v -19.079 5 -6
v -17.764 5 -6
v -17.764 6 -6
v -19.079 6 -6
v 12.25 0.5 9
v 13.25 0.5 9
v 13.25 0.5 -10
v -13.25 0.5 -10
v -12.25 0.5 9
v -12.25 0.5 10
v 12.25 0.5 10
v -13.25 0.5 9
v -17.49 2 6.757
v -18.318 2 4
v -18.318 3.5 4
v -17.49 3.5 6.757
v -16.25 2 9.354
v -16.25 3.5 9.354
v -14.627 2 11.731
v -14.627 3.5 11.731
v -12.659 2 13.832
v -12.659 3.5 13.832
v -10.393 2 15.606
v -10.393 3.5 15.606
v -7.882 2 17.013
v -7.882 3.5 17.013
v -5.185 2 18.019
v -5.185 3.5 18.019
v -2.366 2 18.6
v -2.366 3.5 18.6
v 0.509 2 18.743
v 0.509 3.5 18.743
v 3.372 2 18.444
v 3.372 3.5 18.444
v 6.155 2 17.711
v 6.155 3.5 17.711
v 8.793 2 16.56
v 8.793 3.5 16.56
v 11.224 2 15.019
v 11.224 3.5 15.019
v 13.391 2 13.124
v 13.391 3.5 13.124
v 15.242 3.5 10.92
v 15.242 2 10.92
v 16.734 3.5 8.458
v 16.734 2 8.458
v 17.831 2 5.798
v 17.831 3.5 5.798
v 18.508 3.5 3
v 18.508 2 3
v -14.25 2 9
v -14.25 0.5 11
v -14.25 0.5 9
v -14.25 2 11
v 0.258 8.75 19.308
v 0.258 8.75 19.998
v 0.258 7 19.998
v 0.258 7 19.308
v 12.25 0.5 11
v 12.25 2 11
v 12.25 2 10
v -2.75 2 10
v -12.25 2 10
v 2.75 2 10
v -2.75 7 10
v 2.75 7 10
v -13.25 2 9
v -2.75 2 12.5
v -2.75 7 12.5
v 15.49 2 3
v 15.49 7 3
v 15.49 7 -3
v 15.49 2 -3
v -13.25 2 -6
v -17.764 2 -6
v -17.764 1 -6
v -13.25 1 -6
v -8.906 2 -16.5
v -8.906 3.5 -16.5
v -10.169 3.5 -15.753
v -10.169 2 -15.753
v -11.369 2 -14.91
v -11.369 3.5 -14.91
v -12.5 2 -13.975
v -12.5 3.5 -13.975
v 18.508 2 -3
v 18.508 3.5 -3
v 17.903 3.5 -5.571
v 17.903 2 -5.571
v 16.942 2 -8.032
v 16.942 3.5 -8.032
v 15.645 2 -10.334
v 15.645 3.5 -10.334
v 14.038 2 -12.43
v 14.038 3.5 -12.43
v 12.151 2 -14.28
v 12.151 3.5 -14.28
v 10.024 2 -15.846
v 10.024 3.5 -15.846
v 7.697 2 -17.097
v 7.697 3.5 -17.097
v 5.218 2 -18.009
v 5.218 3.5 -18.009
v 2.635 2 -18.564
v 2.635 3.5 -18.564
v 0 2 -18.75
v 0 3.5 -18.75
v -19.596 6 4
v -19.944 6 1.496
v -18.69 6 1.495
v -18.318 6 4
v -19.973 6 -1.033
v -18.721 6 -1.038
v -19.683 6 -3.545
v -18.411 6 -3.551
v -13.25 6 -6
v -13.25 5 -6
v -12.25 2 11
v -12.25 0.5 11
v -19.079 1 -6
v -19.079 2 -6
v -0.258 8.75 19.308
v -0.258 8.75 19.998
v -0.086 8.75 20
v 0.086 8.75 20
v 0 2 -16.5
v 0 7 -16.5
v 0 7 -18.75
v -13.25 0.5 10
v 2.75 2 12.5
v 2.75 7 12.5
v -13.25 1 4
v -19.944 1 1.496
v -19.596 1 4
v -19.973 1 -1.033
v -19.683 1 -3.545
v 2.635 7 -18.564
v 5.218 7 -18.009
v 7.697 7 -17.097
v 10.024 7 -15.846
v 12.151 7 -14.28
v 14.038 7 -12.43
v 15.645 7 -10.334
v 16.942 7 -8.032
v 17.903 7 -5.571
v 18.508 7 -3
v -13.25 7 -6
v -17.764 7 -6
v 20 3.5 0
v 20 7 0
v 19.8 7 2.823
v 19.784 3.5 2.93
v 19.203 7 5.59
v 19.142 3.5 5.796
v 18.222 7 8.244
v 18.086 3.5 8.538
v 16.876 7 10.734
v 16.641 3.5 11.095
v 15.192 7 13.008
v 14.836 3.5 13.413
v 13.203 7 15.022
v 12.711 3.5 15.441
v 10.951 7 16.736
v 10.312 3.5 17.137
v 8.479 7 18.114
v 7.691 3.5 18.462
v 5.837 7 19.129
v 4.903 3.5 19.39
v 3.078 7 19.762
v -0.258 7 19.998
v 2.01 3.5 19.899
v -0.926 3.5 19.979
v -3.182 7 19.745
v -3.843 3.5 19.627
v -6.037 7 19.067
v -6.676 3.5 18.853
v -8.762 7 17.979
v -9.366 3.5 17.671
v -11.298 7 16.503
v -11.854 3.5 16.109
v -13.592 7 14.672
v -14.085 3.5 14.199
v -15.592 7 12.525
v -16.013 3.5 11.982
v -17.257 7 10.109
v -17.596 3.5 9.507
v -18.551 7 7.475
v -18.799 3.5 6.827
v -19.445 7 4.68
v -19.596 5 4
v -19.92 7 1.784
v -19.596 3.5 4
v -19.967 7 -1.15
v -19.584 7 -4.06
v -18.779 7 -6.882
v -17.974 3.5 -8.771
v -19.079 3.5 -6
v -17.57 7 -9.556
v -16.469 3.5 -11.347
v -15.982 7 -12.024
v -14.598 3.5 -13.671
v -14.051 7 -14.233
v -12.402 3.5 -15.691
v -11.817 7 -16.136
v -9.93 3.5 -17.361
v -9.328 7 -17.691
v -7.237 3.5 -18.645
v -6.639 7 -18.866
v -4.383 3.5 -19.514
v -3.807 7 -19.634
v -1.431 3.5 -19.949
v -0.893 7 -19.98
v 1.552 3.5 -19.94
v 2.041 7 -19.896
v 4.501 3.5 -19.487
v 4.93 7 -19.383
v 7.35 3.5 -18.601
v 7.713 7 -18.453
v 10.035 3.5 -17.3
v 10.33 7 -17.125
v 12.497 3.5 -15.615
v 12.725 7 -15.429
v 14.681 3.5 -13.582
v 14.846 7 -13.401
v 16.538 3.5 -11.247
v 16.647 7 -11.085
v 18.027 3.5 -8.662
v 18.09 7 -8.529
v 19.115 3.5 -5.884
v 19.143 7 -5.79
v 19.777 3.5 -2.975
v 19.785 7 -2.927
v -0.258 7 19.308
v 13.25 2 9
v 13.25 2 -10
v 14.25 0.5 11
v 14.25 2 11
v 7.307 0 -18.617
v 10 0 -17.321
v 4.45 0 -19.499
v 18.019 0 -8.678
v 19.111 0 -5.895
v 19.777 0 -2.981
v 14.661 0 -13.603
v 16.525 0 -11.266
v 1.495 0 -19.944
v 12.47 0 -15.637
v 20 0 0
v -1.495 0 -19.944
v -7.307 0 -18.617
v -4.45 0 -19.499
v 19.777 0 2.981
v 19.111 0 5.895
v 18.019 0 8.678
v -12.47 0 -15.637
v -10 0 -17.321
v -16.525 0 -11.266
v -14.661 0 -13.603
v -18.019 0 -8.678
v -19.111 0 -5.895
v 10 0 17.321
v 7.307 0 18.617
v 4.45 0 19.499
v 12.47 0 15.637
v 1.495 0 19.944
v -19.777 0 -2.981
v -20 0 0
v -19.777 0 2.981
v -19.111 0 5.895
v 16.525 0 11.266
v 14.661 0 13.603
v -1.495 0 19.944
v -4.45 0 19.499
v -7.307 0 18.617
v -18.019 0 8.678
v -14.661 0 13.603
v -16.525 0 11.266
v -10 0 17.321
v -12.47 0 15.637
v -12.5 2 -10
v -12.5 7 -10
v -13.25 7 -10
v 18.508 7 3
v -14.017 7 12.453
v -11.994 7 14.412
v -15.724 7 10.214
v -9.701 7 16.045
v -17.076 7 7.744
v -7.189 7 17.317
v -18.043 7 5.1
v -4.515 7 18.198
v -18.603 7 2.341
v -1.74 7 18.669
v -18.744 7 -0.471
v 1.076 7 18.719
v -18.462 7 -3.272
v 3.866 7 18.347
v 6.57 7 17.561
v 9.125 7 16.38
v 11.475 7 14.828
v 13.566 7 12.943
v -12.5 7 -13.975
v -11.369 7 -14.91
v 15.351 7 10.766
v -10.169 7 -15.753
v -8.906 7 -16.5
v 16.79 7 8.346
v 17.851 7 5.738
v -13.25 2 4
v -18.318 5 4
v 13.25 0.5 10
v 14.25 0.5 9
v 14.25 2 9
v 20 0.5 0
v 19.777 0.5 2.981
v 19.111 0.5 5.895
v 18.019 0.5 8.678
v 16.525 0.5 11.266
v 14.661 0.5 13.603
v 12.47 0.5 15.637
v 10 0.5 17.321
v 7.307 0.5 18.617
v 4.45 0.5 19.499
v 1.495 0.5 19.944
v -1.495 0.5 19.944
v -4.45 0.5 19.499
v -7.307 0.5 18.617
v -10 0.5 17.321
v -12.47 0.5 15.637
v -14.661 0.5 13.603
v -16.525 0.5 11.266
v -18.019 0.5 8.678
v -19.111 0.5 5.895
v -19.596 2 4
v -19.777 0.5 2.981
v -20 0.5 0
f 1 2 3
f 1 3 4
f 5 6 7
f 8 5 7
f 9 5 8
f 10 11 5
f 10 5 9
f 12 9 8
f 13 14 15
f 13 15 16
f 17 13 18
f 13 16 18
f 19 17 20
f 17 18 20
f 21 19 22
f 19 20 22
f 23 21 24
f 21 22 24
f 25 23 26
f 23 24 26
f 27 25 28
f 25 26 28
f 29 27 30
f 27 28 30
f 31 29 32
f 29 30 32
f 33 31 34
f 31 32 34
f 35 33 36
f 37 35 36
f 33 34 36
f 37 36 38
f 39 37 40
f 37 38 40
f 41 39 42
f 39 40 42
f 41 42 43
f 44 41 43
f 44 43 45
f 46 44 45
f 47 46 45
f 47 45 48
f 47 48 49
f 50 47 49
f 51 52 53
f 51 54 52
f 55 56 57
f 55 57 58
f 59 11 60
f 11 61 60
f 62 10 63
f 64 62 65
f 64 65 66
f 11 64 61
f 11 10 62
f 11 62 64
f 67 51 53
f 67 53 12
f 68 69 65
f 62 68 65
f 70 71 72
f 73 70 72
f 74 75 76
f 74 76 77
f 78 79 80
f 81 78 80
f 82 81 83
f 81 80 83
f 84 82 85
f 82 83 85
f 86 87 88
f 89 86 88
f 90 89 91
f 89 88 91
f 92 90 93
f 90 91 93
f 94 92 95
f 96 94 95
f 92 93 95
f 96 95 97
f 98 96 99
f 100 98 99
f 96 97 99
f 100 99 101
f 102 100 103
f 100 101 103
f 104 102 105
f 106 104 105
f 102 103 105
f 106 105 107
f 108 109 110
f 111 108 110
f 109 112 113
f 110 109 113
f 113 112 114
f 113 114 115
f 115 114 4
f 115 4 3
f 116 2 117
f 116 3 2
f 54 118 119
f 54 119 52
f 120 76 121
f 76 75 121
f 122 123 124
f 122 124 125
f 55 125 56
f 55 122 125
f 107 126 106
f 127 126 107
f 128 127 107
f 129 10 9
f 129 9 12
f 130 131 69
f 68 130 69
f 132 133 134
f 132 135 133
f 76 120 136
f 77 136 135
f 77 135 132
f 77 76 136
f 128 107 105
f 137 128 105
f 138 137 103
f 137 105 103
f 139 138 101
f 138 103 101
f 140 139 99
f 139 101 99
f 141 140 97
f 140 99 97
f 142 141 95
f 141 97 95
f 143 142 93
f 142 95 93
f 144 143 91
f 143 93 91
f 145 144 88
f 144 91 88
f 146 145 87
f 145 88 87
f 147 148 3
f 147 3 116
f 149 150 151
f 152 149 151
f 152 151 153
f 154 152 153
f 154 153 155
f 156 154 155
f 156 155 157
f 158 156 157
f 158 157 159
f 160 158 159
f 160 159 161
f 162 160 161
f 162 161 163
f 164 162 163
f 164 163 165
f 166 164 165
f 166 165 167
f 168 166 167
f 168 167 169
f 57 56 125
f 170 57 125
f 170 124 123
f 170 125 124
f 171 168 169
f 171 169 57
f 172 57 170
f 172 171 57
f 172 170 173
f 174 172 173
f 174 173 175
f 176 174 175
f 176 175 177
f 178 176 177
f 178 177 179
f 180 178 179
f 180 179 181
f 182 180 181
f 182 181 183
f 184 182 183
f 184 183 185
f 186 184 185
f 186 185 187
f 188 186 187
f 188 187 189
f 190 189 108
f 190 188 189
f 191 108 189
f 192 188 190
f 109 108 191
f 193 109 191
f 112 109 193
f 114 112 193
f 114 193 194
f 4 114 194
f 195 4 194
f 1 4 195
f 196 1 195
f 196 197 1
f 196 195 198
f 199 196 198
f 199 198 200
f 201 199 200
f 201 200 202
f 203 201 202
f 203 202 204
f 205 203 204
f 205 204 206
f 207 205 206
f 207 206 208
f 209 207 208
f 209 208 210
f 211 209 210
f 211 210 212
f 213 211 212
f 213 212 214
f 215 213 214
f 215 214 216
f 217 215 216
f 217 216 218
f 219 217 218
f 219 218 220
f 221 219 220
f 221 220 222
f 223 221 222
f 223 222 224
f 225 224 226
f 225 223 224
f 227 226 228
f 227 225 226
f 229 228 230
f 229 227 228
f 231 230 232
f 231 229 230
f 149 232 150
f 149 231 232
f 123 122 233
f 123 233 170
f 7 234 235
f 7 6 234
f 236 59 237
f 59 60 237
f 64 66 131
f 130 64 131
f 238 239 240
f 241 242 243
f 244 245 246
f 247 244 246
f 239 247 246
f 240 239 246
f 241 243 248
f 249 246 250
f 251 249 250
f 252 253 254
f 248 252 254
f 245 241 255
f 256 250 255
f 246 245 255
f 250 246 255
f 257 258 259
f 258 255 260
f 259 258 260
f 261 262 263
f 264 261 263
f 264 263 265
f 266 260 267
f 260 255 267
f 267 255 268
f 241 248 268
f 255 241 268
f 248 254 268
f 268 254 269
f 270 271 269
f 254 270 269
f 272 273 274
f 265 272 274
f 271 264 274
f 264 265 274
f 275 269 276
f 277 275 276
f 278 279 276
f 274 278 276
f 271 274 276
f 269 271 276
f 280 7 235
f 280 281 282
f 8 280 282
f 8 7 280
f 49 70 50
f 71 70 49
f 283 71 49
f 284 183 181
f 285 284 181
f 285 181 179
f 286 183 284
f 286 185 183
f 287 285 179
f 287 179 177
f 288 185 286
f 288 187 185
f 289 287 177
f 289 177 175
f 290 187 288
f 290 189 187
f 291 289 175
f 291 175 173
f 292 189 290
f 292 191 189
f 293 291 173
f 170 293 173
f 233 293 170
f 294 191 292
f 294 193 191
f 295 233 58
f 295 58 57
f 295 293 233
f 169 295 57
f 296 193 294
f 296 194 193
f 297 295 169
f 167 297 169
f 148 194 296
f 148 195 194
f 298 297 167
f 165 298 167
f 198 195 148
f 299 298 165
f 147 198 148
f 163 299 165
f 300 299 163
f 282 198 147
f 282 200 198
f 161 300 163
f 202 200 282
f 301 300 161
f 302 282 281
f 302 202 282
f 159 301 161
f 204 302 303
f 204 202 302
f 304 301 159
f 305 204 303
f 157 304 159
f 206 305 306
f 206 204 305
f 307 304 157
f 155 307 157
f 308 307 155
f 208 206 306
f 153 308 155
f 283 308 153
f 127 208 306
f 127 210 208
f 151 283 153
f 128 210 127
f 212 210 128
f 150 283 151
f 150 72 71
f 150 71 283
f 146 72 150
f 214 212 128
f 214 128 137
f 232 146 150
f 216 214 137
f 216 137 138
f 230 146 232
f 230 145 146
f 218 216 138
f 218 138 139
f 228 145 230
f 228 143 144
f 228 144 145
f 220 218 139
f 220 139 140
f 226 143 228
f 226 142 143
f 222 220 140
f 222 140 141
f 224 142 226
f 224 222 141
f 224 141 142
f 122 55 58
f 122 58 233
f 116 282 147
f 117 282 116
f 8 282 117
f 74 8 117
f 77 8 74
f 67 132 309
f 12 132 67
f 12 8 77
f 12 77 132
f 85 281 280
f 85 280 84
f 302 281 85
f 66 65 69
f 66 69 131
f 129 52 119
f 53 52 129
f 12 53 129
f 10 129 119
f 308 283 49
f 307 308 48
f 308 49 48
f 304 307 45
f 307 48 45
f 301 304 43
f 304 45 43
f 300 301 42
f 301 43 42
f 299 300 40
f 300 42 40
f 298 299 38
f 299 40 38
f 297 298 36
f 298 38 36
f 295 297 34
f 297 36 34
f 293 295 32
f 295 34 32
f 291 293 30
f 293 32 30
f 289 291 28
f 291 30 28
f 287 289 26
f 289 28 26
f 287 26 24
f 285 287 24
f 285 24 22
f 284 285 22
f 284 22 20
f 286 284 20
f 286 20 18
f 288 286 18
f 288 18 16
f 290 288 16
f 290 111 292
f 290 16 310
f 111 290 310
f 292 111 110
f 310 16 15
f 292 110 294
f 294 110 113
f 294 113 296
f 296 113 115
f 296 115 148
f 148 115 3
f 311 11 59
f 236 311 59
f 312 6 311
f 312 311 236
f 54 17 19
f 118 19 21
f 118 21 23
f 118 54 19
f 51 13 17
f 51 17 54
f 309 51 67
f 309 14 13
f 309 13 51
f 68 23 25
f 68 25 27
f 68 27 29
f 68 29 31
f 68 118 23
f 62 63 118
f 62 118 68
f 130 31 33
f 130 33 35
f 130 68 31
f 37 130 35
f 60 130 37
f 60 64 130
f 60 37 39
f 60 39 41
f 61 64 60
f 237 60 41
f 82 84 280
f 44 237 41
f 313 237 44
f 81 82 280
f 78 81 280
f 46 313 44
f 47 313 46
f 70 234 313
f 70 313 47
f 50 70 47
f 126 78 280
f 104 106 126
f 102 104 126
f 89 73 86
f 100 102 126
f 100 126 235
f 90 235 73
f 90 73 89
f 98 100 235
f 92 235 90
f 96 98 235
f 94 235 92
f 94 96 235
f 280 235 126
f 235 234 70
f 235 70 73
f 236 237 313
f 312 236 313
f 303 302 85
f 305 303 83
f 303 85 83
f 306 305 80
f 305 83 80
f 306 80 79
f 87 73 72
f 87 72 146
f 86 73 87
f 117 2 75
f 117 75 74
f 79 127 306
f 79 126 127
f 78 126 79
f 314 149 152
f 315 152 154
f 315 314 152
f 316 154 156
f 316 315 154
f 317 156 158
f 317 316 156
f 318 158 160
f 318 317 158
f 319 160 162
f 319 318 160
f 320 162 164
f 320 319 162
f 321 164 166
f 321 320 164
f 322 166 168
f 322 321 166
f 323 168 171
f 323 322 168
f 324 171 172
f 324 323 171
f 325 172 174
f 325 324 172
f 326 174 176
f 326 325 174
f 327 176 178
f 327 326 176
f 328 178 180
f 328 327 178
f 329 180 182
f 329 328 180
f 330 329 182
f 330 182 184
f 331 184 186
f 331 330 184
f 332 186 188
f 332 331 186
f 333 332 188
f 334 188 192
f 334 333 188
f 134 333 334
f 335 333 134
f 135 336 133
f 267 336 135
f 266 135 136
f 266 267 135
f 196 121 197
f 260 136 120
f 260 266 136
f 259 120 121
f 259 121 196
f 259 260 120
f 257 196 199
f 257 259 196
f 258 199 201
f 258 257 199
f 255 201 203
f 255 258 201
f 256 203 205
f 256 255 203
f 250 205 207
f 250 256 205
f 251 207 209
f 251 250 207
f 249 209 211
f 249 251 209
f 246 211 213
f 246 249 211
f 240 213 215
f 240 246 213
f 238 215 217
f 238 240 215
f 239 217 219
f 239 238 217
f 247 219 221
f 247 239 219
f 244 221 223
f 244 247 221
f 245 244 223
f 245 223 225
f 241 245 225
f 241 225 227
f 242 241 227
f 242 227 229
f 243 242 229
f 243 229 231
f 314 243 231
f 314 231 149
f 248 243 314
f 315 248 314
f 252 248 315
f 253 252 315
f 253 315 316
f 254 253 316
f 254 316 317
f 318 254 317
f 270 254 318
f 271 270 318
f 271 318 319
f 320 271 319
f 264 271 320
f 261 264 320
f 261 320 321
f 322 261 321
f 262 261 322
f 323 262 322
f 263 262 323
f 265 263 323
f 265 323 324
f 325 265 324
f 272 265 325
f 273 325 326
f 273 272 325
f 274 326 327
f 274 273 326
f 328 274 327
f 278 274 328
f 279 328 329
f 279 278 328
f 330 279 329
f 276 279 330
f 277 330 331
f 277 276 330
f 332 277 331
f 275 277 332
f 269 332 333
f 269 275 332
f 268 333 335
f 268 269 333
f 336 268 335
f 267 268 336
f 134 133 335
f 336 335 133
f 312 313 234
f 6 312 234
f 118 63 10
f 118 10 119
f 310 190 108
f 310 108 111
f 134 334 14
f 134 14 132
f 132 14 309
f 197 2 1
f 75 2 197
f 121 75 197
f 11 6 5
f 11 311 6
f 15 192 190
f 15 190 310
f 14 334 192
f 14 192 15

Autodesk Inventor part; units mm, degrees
ref_plane "YZ Plane" through (0, 0, 0) normal (1, 0, 0) x (0, 1, 0)
ref_plane "XZ Plane" through (0, 0, 0) normal (0, 1, 0) x (-1, 0, 0)
sketch "Sketch1" plane through (0, 0, 0) normal (0, 1, 0) x (-1, 0, 0)
  circle A0 centre (0, 0) radius 20
  dimension "d0" = 40
extrude "Extrusion1" add sketch "Sketch1" along normal blind 0.5
sketch "Sketch2" plane through (0, 0.5, 0) normal (0, 1, 0) x (1, 0, 0)
  line L0 (-13.25, -10) -> (13.25, -10)
  line L1 (13.25, -10) -> (13.25, 10)
  line L2 (13.25, 10) -> (-13.25, 10)
  line L3 (-13.25, 10) -> (-13.25, -10)
  line L4 (-13.25, -10) -> (13.25, 10) construction
  line L5 (13.25, -10) -> (-13.25, 10) construction
  circle A0 centre (0, 0) radius 20
  dimension "d3" = 26.5
  dimension "d4" = 20
extrude "Extrusion2" add sketch "Sketch2" along normal blind 3
ref_plane "Work Plane1" through (0, 3.5, 0) normal (0, 1, 0) x (1, 0, 0)
sketch "Sketch3" plane through (0, 3.5, 0) normal (0, 1, 0) x (1, 0, 0)
  line L0 (16.25, 0) -> (16.25, 3)
  line L1 (16.25, 3) -> (18.2551, 3)
  line L2 (16.25, 0) -> (16.25, -3)
  line L3 (16.25, -3) -> (18.2551, -3)
  line L4 (0, -18.5) -> (0, -12.5)
  line L5 (0, -12.5) -> (2.75, -12.5)
  line L6 (2.75, -12.5) -> (-2.75, -12.5)
  line L7 (-2.75, -12.5) -> (-2.75, -10)
  line L8 (-2.75, -10) -> (2.75, -10)
  line L9 (2.75, -10) -> (2.75, -12.5)
  line L10 (-17.5, 6) -> (-13.25, 6)
  line L11 (-12.5, 10) -> (-12.5, 13.6382)
  line L12 (0, 18.5) -> (0, 16.5)
  line L13 (0, 16.5) -> (-8.3666, 16.5)
  line L14 (18.2551, -3) -> (15.4901, -3)
  line L15 (15.4901, -3) -> (15.4901, 3)
  line L16 (15.4901, 3) -> (16.25, 3)
  circle A0 centre (0, 0) radius 18.75
  line L17 (18.2551, 3) -> (18.5084, 3)
  line L18 (18.2551, -3) -> (18.5084, -3)
  line L19 (0, 18.5) -> (0, 18.75)
  line L20 (-8.3666, 16.5) -> (-8.9058, 16.5)
  line L21 (-17.5, 6) -> (-17.7641, 6)
  line L22 (-12.5, 13.6382) -> (-12.5, 13.9754)
  line L23 (-13.25, 10) -> (13.25, 10) projected
  line L24 (-12.5, 10) -> (-13.25, 10)
  line L25 (-13.25, 10) -> (-13.25, 6)
  line L26 (-13.25, -10) -> (-13.25, 10) projected
  circle A1 centre (0, 0) radius 20
  dimension "d8" = 6
  dimension "d9" = 2.75
  dimension "d10" = 5.5
  dimension "d11" = 2
  dimension "d12" = 2.765
  dimension "d13" = 37.5
extrude "Extrusion3" cut sketch "Sketch3" against normal blind 1.5 contours L16 L15 L14 L3 L18 A0 L21 L10 L25 L23 L11 L22 L20 L13 L12 L19 L17 L1
extrude "Extrusion4" add sketch "Sketch3" along normal blind 5.25 contours L2 L14 L15 L16 L0 | L0 L1 L17 A0 L18 L3 L2 | L19 L12 L13 L20 A0 | A0 L22 L11 L23 L25 L10 L21 | L6 L7 L8 L9 L5
extrude "Extrusion5" add sketch "Sketch3" along normal blind 5.25 contours A1
sketch "Sketch4" plane through (0, 2, 0) normal (0, 1, 0) x (1, 0, 0)
  line L0 (14.25, -9) -> (12.25, -9)
  line L1 (12.25, -9) -> (12.25, -11)
  line L2 (12.25, -11) -> (14.25, -11)
  line L3 (14.25, -11) -> (14.25, -9)
  line L4 (2.75, -10) -> (13.25, -10) projected
  line L5 (14.25, -9) -> (12.25, -11) construction
  line L6 (12.25, -9) -> (14.25, -11) construction
  point P0 (0, 0)
  dimension "d20" = 2
  dimension "d21" = 2
extrude "Extrusion6" cut sketch "Sketch4" against normal blind 1.5
sketch "Sketch5" plane through (0, 8.75, 0) normal (0, 1, 0) x (1, 0, 0)
  circle A0 centre (0, 0) radius 19.25
  circle A1 centre (0, 0) radius 20
  circle A2 centre (0, 0) radius 19.5
  dimension "d24" = 38.5
  dimension "d25" = 39
extrude "Extrusion7" add sketch "Sketch5" along normal blind 5 contours A1 | A2
extrude "Extrusion8" add sketch "Sketch5" along normal blind 6 contours A1
sketch "Sketch6" plane through (0, 14.75, 0) normal (0, 1, 0) x (1, 0, 0)
  line L0 (-0.2579, -20.6923) -> (0.2579, -20.6923)
  line L1 (0.2579, -20.6923) -> (0.2579, -19.3077)
  line L2 (0.2579, -19.3077) -> (-0.2579, -19.3077)
  line L3 (-0.2579, -19.3077) -> (-0.2579, -20.6923)
  circle A0 centre (0, 0) radius 20 projected
  line L4 (-0.2579, -20.6923) -> (0.2579, -19.3077) construction
  line L5 (0.2579, -20.6923) -> (-0.2579, -19.3077) construction
  point P0 (0, -20)
  point P1 (0.2579, -19.9983)
  point P2 (-0.2579, -19.9983)
extrude "Extrusion9" add sketch "Sketch6" along normal blind 1 contours L3 A0 L1 L0 | L3 L2 L1 A0 picked at (-0.0287, -19.5384)
sketch "Sketch7" plane through (0.2579, 14.75, 20.6923) normal (1, 0, 0) x (0, 0, -1)
  line L0 (0, 0) -> (0.6939, 0) projected
  line L1 (0.6939, 0) -> (0.9439, 0)
  line L2 (1.194, 0) -> (0.6939, 0) projected
  circle A0 centre (0.9439, 0) radius 0.25
  line L3 (1.194, 0) -> (1.3845, 0) projected
  line L4 (1.194, 0) -> (2.041, 0)
  point P0 (20.6923, -14.75)
  point P1 (0.6939, 0)
  dimension "d32" = 0.25
extrude "Extrusion10" cut sketch "Sketch6" along normal blind 1 contours L3 A0 L1 L0 | L3 L2 L1 A0 picked at (-0.0287, -19.5384)
sketch "Sketch8" plane through (0, 2, 0) normal (0, 1, 0) x (1, 0, 0)
  line L0 (-17.7641, 6) -> (-13.25, 6) projected
  line L1 (-13.25, 6) -> (-22.0504, 6)
  line L2 (-22.0504, 6) -> (-22.0504, -4)
  line L3 (-22.0504, -4) -> (-13.25, -4)
  line L4 (-13.25, -4) -> (-13.25, 6)
  point P0 (0, 0)
  dimension "d37" = 10
extrude "Extrusion11" cut sketch "Sketch8" against normal blind 1
extrude "Extrusion12" cut sketch "Sketch8" along normal blind 3
extrude "Extrusion13" cut sketch "Sketch8" along normal blind 4
sketch "Sketch9" plane through (0, 2, 0) normal (0, 1, 0) x (1, 0, 0)
  line L0 (-12.25, -11) -> (-14.25, -11)
  line L1 (-14.25, -11) -> (-14.25, -9)
  line L2 (-14.25, -9) -> (-12.25, -9)
  line L3 (-12.25, -9) -> (-12.25, -11)
  line L4 (-12.25, -11) -> (-14.25, -9) construction
  line L5 (-14.25, -11) -> (-12.25, -9) construction
  point P0 (0, 0)
  point P1 (-13.25, -10)
  dimension "d44" = 2
  dimension "d45" = 2
extrude "Extrusion14" cut sketch "Sketch9" against normal blind 1.5
extrude "Extrusion15" cut sketch "Sketch6" against normal blind 7.75 contours A0 L1 L2 L3 picked at (-0.5744, 6.7866)
extrude "Extrusion16" cut sketch "Sketch5" along normal blind 7.75 contours A0 | A1 | A2
properties part number "t2"
